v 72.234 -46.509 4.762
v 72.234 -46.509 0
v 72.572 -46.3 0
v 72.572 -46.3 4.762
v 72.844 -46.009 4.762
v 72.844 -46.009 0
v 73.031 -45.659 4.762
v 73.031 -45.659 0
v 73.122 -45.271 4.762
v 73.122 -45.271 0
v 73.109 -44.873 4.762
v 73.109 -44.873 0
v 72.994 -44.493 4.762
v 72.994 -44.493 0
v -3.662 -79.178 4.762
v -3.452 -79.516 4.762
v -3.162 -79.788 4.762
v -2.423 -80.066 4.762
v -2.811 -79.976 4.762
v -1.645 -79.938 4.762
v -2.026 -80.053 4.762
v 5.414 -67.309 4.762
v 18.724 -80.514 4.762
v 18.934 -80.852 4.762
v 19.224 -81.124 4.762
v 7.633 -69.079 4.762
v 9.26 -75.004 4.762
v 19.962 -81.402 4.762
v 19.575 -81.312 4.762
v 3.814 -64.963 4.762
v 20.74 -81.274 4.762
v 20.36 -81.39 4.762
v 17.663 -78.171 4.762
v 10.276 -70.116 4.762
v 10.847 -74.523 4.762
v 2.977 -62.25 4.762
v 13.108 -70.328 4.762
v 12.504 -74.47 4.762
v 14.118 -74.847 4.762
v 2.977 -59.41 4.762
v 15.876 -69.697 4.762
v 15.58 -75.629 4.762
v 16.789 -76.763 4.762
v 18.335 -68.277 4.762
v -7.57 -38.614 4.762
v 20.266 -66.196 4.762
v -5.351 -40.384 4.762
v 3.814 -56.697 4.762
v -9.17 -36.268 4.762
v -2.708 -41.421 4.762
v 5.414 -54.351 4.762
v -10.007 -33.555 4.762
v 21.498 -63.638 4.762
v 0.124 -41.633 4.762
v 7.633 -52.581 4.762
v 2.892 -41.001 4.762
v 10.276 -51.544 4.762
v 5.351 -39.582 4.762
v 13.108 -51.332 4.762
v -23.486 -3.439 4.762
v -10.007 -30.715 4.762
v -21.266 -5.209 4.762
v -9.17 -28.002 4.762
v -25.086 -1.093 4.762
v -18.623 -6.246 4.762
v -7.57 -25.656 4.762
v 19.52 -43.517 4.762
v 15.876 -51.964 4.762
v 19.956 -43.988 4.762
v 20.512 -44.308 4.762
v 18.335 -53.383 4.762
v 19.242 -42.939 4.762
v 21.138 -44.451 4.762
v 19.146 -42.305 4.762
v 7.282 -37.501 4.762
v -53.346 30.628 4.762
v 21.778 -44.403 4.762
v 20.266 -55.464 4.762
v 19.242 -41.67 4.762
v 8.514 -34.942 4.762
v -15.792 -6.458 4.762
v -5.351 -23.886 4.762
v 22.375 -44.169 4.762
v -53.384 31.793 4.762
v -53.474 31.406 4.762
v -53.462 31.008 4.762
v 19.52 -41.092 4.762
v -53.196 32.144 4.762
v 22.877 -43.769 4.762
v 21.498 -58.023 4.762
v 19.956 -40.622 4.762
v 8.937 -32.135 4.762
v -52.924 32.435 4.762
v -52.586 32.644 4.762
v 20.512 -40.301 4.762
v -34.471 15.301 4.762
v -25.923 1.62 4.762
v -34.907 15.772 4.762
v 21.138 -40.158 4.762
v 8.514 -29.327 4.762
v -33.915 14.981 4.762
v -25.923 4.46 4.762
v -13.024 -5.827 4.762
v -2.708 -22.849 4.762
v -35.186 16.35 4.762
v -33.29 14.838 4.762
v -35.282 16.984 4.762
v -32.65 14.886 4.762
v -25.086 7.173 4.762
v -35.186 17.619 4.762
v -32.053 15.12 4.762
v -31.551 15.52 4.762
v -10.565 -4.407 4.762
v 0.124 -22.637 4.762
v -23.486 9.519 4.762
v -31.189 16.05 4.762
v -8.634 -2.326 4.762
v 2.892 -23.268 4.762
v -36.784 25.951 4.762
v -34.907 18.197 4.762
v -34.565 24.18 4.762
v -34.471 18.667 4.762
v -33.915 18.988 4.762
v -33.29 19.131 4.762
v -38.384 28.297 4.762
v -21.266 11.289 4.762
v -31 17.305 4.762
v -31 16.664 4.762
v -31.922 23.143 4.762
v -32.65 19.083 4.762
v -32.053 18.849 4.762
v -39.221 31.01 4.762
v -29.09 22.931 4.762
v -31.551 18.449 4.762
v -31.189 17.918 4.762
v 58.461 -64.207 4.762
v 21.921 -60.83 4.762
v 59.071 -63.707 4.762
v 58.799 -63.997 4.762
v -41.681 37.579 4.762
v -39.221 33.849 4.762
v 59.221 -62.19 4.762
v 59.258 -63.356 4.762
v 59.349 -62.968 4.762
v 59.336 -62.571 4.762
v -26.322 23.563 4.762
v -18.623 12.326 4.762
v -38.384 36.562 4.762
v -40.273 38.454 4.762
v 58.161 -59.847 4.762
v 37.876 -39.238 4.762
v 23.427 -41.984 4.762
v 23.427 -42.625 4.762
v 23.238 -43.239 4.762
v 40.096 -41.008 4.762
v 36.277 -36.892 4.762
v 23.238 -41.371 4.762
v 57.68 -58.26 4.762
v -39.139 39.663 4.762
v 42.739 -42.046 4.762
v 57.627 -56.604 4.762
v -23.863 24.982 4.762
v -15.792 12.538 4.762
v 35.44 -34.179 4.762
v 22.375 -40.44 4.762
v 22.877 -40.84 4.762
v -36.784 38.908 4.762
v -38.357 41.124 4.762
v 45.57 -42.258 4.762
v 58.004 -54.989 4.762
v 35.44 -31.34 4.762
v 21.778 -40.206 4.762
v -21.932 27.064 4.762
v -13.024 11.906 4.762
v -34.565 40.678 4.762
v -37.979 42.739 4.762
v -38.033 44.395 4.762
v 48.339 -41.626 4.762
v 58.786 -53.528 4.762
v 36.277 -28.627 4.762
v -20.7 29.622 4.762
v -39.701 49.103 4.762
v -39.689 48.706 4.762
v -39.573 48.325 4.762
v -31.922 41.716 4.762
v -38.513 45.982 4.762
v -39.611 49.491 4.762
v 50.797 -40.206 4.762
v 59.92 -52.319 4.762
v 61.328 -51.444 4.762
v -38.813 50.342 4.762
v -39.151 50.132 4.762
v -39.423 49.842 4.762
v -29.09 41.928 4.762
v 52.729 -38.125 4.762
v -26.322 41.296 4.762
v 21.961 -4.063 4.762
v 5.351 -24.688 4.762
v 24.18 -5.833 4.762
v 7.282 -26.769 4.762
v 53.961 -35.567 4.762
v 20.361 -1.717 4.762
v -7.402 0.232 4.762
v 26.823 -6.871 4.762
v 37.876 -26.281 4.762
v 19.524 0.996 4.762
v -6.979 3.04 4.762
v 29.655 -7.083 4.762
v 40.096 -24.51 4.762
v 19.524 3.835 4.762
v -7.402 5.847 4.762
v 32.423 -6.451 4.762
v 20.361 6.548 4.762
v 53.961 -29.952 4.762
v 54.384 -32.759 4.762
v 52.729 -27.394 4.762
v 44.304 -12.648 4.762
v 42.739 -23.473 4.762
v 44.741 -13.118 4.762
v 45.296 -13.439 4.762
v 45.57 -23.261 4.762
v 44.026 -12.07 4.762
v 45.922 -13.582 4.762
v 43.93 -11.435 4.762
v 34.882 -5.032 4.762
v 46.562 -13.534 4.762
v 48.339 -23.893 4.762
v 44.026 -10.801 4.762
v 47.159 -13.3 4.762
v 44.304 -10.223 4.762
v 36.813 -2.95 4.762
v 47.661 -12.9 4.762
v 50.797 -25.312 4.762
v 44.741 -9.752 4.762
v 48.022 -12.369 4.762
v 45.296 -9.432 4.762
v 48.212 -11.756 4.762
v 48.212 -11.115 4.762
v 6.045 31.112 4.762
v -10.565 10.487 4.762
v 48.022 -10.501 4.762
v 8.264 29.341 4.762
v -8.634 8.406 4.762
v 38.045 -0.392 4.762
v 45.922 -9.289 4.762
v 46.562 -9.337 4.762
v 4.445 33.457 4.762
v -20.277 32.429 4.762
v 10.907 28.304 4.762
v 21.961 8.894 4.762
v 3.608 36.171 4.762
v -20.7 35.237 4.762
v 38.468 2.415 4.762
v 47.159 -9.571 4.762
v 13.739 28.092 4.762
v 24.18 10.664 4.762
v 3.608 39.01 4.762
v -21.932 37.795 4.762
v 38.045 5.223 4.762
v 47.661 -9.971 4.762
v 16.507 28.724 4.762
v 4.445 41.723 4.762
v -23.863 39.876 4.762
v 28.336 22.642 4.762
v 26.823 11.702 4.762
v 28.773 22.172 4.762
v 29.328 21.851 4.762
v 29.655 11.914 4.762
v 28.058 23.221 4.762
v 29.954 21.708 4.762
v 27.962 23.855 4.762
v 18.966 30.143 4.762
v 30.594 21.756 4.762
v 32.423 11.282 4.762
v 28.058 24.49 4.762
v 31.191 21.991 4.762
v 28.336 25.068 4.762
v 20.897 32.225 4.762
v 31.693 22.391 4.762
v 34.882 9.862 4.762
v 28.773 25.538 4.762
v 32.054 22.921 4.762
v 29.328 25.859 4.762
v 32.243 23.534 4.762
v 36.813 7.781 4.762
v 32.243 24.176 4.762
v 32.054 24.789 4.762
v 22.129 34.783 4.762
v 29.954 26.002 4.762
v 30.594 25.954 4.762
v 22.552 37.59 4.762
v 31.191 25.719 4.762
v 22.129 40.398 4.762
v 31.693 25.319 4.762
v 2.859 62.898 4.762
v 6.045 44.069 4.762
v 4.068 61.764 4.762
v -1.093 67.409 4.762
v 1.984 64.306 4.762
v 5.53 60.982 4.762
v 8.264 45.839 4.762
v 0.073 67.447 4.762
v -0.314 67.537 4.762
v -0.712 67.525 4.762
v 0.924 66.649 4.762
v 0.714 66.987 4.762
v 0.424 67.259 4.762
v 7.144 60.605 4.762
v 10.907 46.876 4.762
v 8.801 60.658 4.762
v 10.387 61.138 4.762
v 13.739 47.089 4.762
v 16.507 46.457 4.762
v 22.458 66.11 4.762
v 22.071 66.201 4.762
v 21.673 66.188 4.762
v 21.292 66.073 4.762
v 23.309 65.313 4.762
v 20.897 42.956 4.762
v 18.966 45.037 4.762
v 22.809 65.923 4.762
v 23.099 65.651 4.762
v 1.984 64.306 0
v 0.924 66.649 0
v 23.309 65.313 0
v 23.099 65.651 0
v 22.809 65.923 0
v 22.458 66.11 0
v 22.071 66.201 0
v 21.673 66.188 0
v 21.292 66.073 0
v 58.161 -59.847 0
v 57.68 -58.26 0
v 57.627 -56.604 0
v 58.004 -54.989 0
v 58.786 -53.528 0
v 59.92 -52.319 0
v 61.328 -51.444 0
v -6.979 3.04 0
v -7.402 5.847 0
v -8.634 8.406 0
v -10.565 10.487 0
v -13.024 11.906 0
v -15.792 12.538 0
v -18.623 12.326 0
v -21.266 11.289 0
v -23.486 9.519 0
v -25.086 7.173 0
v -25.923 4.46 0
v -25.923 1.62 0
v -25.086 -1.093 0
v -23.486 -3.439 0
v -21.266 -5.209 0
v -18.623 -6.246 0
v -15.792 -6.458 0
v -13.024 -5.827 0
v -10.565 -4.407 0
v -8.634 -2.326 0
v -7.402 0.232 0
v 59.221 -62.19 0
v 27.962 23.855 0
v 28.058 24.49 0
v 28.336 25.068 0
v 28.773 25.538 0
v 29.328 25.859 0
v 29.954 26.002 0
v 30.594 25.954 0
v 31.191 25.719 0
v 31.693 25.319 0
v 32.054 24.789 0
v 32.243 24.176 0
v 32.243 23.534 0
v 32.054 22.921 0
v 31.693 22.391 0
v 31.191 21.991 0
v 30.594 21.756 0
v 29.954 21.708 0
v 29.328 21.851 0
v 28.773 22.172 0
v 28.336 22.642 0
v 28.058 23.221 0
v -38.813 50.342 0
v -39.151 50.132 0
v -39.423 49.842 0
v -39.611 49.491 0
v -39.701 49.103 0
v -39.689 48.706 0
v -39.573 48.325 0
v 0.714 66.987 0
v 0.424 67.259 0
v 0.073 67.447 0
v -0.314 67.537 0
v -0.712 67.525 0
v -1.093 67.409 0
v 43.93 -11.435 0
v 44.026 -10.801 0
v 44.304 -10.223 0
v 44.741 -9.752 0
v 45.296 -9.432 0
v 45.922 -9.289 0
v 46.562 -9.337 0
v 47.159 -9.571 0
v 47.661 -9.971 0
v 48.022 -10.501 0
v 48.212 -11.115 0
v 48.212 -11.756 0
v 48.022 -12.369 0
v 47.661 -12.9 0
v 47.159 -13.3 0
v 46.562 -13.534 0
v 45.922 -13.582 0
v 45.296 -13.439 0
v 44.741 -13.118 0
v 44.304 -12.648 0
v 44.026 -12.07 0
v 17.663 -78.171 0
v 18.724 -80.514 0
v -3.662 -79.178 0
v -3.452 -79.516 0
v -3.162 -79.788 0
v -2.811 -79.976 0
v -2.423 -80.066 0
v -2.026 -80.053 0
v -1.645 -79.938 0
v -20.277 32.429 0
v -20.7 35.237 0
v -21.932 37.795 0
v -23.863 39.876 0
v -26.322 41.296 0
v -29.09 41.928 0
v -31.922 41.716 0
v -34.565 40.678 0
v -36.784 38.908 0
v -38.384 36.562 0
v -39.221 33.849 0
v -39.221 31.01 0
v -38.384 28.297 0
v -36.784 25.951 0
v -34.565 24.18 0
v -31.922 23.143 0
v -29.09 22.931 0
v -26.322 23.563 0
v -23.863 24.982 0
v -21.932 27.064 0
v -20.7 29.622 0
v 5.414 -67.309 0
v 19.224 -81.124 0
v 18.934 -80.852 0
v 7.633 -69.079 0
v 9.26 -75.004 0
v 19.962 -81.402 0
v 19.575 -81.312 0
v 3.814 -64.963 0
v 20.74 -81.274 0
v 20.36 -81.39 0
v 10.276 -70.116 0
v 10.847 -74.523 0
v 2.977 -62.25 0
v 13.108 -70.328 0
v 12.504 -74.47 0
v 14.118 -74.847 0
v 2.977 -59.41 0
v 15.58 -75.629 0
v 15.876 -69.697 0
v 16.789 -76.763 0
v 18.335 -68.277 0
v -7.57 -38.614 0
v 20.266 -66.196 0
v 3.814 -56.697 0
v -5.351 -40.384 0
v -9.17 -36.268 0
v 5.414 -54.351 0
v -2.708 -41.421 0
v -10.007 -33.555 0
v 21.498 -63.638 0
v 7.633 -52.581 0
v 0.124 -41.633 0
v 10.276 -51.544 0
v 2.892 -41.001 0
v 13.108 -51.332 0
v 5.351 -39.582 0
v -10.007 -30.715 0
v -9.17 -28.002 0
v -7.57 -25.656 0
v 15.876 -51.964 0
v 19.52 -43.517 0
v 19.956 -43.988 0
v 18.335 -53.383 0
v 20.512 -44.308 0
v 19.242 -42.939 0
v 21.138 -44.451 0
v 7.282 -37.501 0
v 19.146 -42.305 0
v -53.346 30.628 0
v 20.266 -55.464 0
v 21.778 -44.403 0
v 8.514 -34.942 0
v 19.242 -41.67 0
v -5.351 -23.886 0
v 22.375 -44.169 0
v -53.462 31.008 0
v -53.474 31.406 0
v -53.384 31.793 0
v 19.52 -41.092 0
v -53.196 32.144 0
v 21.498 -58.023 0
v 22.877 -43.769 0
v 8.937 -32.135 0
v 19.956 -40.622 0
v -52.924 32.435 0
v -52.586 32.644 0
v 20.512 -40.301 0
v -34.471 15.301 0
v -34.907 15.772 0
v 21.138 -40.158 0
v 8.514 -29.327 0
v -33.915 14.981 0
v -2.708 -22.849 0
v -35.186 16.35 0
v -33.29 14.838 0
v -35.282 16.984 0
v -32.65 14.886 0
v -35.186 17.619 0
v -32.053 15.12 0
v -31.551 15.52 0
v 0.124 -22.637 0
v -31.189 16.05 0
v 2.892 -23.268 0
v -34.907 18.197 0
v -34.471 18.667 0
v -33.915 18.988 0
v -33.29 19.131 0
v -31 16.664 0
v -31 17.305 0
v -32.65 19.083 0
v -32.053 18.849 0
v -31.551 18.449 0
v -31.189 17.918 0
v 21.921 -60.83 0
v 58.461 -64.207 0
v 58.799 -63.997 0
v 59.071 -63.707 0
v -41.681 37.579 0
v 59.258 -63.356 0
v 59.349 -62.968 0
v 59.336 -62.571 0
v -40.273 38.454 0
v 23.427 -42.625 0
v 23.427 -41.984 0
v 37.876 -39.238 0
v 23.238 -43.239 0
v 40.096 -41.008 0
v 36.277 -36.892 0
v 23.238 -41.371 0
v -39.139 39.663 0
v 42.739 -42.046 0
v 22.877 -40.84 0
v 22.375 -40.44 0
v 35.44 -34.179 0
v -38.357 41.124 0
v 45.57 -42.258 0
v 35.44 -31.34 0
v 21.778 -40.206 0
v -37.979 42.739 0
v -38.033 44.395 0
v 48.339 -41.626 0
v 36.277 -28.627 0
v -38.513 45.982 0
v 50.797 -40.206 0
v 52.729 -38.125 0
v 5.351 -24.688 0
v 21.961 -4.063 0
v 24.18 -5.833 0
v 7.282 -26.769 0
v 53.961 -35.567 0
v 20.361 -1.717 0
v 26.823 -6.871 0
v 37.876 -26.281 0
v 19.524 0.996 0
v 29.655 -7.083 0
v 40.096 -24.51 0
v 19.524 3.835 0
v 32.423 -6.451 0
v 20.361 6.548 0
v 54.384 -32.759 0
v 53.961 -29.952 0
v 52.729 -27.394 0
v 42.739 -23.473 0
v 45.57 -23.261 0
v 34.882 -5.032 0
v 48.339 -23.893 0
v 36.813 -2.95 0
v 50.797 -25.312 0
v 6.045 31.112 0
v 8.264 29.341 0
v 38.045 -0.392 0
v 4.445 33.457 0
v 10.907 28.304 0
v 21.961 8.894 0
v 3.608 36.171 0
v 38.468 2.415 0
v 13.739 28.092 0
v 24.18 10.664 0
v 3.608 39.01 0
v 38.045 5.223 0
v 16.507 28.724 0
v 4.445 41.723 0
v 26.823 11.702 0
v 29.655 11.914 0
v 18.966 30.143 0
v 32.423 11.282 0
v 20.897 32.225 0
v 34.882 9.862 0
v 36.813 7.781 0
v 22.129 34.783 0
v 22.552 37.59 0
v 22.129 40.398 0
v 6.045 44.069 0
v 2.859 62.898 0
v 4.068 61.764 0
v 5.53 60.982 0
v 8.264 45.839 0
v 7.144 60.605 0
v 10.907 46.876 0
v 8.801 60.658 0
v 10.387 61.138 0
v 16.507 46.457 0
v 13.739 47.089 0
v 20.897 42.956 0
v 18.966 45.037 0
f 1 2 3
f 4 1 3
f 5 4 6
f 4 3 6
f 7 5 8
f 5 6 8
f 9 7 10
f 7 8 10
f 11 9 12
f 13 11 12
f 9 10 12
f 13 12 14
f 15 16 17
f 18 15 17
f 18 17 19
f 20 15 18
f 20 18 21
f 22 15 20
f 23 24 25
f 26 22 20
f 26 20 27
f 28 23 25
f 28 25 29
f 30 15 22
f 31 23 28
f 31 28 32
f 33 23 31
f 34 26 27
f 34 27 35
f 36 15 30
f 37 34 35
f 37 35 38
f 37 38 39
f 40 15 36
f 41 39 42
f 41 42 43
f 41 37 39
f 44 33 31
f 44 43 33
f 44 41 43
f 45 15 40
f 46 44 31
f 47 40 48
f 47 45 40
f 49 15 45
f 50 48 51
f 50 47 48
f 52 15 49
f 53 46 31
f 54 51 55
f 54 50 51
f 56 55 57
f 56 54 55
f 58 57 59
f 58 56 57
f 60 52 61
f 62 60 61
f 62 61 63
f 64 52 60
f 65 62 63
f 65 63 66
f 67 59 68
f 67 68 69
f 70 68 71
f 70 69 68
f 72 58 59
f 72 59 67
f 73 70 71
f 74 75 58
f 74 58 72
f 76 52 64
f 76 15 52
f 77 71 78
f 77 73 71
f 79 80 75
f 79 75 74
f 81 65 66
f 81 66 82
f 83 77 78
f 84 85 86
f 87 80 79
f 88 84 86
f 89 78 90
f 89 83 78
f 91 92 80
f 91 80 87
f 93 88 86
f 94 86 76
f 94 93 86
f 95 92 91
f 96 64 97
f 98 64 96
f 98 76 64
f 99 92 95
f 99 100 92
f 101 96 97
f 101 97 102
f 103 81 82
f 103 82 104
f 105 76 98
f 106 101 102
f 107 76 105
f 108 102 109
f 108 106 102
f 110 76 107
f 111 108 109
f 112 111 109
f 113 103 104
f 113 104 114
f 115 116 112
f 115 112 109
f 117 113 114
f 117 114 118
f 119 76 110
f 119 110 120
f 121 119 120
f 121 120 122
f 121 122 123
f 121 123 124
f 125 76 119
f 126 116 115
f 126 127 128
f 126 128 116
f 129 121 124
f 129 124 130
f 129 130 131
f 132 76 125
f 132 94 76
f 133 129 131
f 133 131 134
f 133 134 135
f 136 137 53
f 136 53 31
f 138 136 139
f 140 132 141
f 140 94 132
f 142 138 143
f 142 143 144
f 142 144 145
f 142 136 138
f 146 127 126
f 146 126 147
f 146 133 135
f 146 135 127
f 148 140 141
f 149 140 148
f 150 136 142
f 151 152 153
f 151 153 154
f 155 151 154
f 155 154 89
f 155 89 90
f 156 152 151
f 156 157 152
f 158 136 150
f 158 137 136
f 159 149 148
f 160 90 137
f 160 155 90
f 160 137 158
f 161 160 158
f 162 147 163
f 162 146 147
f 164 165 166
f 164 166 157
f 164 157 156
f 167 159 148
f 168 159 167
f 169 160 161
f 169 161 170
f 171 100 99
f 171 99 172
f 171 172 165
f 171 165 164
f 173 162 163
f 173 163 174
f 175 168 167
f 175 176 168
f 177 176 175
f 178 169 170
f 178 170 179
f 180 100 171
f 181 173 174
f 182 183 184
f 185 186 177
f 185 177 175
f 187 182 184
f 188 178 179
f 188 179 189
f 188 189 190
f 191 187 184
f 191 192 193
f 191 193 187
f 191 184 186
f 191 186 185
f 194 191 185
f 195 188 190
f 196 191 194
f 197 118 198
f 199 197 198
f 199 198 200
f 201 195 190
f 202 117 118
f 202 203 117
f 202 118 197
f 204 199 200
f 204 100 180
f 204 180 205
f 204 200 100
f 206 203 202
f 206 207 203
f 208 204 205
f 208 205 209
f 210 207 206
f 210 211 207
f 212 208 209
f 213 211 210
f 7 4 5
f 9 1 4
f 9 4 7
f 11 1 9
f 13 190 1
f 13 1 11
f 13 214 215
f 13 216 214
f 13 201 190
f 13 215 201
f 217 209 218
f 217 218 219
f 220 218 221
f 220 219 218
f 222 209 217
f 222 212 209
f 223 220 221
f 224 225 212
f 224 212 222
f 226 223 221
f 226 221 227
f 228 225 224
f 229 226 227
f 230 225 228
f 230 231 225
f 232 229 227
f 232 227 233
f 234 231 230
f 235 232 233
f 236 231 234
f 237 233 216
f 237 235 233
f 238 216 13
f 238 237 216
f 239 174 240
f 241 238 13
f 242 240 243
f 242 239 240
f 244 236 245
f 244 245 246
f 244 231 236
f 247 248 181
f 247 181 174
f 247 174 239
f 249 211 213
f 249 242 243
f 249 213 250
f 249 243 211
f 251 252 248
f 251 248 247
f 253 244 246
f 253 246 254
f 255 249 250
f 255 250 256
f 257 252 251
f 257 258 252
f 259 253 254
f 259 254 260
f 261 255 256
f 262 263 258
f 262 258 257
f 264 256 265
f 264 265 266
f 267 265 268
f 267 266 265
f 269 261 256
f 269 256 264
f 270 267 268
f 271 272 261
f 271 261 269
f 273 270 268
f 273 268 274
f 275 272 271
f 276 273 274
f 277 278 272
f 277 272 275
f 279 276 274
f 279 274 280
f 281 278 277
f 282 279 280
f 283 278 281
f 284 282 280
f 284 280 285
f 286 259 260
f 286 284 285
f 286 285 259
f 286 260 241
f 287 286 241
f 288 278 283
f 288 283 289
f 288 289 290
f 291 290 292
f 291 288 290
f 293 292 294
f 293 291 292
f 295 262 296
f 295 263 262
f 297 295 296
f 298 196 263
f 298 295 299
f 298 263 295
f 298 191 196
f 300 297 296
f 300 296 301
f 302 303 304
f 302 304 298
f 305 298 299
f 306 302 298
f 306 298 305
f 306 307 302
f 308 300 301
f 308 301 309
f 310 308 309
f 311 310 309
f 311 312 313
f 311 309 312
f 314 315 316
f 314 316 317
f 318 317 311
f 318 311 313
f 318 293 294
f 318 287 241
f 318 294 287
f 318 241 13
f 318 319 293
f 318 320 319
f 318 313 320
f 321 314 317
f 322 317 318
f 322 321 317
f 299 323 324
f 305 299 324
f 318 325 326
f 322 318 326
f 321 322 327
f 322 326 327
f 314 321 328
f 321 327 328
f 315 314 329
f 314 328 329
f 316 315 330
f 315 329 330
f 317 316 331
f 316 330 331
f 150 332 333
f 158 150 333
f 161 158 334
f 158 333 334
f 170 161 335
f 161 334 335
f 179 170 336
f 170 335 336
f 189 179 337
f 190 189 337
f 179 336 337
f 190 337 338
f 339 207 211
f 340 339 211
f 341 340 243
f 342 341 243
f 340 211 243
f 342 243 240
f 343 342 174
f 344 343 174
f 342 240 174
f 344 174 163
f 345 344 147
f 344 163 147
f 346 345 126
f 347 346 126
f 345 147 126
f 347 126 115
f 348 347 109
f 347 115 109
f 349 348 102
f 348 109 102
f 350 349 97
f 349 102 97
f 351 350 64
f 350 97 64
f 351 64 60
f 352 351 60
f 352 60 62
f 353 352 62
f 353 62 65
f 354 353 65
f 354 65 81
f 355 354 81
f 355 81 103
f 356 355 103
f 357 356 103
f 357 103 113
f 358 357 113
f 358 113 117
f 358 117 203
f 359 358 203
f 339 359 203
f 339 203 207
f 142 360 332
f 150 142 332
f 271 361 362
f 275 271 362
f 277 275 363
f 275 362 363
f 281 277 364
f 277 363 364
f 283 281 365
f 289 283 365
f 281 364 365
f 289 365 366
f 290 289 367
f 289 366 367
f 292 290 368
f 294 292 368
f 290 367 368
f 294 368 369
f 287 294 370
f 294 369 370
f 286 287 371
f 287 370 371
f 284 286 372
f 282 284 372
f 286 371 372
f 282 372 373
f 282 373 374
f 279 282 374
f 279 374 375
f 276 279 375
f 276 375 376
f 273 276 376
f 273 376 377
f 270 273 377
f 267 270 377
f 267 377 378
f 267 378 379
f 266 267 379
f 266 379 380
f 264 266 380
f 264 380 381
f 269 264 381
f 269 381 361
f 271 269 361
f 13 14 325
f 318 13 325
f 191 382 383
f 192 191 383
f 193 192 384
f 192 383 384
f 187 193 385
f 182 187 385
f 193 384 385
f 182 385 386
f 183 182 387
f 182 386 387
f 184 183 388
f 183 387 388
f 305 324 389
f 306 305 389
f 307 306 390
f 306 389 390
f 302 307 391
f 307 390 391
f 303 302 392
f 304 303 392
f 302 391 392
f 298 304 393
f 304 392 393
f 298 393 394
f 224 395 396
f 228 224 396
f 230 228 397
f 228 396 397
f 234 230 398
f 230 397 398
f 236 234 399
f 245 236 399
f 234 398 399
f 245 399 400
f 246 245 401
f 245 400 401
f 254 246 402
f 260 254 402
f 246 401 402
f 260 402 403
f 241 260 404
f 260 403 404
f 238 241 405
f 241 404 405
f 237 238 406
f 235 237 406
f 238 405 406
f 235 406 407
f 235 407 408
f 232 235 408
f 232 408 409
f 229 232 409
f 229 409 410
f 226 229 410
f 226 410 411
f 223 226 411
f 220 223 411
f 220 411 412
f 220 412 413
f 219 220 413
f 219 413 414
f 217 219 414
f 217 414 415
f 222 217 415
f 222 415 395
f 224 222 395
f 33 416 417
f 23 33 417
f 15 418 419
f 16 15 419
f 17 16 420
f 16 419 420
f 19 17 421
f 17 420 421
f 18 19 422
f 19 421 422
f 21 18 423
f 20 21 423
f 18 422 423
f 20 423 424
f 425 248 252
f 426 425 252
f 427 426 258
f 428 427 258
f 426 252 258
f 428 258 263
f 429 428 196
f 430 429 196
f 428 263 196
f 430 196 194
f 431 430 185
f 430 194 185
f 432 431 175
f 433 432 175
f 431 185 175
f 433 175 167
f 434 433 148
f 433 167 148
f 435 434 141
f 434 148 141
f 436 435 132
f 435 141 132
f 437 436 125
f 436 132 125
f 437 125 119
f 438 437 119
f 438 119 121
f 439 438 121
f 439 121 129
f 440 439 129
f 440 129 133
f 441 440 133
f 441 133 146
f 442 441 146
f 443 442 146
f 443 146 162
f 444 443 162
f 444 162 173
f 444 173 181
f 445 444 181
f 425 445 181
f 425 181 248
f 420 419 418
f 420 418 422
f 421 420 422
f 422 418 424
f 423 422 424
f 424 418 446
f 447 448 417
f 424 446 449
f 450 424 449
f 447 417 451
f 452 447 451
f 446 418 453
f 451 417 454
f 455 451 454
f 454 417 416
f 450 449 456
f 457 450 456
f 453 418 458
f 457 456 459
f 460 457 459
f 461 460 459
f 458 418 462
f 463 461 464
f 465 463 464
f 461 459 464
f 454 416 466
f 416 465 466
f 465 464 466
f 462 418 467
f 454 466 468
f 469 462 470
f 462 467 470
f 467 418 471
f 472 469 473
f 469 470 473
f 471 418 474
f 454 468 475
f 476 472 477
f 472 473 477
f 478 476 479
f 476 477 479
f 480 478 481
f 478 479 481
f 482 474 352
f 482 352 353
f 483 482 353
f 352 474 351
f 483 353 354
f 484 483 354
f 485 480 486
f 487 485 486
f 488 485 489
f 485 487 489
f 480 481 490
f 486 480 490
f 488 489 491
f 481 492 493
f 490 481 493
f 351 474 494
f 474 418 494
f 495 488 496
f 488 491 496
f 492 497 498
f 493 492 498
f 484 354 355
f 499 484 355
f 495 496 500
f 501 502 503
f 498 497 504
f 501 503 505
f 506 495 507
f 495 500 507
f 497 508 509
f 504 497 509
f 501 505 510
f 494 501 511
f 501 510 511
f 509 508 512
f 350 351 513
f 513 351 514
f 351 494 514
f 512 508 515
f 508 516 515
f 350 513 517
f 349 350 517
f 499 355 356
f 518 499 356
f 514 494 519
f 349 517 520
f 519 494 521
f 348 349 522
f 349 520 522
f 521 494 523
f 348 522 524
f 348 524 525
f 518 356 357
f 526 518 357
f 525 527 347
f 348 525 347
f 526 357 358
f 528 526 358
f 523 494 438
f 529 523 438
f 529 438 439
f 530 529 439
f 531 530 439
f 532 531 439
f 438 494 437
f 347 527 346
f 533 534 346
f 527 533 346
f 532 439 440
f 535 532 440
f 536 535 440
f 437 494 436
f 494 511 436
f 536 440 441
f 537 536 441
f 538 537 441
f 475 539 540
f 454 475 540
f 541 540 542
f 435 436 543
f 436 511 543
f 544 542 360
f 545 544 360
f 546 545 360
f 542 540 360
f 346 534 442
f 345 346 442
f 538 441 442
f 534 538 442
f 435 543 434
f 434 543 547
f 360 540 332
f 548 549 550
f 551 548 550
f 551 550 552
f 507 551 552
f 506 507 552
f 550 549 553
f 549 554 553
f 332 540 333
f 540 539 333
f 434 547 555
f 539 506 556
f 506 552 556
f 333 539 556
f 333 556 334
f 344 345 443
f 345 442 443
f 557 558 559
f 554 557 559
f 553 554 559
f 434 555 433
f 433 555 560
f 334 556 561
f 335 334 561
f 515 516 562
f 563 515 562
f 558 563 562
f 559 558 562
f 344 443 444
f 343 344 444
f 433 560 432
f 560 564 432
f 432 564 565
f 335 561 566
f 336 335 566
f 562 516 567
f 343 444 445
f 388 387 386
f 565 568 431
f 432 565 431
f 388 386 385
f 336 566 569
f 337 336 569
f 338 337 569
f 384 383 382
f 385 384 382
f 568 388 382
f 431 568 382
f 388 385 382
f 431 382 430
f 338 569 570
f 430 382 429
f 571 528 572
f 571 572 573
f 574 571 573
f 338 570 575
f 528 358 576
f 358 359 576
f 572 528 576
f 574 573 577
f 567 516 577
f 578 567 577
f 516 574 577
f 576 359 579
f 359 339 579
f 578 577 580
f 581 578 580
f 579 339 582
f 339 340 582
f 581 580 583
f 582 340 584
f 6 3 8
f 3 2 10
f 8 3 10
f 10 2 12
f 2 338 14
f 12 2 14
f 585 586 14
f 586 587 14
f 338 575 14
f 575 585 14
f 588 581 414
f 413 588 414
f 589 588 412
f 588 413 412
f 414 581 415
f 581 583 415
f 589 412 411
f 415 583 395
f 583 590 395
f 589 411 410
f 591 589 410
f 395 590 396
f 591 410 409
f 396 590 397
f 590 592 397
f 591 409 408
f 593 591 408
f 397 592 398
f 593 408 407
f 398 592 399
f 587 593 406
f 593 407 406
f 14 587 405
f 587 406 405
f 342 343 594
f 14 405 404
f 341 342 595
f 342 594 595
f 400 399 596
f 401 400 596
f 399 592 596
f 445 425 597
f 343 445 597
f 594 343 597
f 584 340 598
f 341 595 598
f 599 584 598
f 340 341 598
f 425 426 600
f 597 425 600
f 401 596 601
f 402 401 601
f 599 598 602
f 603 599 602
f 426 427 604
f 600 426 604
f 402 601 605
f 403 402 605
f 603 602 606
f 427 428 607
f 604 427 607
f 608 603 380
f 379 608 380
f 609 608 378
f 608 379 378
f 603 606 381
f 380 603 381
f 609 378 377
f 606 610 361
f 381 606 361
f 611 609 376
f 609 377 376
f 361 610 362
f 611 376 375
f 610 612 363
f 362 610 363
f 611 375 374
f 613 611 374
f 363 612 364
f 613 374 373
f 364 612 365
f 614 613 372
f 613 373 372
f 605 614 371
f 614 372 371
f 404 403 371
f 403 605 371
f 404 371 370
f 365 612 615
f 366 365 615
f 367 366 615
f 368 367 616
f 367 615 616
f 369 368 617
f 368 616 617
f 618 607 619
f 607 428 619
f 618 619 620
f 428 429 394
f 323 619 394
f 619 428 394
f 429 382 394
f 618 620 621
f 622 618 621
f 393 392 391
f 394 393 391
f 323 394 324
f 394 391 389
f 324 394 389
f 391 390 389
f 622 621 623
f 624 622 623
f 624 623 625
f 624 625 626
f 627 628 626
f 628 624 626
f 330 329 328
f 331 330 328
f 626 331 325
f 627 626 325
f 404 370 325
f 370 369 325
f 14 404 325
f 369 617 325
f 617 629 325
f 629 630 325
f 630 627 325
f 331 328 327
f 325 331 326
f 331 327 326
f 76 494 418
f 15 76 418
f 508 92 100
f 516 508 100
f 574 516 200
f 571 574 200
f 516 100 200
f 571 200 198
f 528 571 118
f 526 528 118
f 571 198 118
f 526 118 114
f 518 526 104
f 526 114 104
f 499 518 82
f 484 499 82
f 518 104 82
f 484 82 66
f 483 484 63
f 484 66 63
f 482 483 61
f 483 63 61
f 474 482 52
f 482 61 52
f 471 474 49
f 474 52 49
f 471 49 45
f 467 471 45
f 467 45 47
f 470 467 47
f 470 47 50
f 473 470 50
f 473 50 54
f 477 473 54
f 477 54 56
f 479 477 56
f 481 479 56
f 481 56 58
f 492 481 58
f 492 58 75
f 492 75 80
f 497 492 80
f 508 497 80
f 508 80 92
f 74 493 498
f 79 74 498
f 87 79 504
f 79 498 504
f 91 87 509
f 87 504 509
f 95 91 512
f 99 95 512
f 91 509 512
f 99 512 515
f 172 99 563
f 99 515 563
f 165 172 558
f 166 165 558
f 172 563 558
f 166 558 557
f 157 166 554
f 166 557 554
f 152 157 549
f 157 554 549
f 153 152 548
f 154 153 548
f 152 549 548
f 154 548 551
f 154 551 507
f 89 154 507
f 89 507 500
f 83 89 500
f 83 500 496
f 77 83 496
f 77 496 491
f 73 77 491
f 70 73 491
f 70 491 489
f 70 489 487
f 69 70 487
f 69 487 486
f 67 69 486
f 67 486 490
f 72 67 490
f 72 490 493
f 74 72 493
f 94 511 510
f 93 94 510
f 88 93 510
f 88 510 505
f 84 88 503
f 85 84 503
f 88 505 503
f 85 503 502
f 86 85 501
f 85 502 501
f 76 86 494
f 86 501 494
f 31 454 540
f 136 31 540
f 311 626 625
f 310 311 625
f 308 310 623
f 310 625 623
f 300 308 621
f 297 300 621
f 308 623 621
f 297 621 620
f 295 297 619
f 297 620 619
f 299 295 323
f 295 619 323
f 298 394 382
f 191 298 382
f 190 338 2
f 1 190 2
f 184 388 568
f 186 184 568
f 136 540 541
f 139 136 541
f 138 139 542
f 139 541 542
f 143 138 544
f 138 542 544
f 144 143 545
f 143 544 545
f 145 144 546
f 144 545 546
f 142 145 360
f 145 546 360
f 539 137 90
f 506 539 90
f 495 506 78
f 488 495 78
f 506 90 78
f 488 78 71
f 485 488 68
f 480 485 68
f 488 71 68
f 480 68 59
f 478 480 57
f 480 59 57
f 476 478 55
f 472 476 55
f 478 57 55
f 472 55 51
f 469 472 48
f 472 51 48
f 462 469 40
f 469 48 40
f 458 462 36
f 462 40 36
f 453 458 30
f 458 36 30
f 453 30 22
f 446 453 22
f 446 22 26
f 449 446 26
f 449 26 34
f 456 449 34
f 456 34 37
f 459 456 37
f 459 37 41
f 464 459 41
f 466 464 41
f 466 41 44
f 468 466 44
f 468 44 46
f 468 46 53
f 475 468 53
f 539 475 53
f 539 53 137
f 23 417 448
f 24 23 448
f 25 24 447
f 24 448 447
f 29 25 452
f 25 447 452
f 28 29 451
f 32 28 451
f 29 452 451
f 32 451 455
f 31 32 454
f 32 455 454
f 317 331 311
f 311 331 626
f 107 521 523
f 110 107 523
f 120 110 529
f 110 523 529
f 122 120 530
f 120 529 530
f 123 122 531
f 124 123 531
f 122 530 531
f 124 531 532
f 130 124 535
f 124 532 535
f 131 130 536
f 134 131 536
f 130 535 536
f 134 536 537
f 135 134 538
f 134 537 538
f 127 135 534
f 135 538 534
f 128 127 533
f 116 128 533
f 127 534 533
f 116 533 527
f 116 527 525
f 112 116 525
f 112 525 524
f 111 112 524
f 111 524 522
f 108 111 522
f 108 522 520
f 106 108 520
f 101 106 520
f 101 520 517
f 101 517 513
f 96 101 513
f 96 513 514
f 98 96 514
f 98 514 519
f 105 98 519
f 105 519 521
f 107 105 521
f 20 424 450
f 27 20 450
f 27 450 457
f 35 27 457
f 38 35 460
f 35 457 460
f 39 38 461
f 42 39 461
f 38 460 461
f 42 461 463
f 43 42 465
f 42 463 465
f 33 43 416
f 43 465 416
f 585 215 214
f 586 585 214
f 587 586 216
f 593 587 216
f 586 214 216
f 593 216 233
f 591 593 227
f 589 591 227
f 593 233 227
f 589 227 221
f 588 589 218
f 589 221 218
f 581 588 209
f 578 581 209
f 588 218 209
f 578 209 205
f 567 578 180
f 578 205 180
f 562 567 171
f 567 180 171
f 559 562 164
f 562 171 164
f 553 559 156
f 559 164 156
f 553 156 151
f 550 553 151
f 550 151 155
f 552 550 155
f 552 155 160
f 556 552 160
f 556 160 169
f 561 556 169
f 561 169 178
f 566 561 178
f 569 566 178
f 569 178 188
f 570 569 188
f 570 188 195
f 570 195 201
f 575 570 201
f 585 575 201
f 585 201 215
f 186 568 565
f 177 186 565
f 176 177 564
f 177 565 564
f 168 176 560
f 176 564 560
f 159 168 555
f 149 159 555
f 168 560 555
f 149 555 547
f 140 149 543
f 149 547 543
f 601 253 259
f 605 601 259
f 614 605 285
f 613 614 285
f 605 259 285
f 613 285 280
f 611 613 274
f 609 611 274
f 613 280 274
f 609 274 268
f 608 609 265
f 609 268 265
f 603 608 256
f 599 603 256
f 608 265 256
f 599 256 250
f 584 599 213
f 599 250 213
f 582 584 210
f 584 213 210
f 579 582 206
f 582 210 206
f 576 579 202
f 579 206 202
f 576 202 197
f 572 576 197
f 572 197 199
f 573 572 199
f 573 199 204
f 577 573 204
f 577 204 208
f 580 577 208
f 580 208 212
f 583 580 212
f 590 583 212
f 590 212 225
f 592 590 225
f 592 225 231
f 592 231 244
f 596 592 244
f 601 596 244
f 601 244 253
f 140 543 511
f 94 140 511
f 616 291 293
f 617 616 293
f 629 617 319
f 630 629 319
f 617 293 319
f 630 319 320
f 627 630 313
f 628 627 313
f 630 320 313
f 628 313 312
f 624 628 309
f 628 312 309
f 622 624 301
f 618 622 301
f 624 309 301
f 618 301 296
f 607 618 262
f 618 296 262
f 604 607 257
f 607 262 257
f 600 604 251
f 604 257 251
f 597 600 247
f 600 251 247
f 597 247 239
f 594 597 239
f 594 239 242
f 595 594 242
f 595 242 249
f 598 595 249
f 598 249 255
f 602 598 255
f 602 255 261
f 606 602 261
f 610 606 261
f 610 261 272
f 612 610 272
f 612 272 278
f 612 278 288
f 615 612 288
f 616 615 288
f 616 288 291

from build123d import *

# Parameters (mm, degrees)
BOSS_EXTRUDE1_DEPTH   = 4.7625
F_6_CLEARANCE_HOLE1_D = 4.3053
SKETCH6_R             = 9.525
CUT_EXTRUDE1_DEPTH    = 5.7625


with BuildPart() as part:
    # Sketch1 → Boss-Extrude1 (new body)
    with BuildSketch(Plane.XY):
        with BuildLine():
            Line((61.328308874, -51.443881834), (72.233641051, -46.509447198))
            ThreePointArc((72.233641051, -46.509447198), (73.031430575, -45.658526875), (72.993861427, -44.492712962))
            Line((72.993861427, -44.492712962), (23.309209228, 65.312700679))
            ThreePointArc((23.309209228, 65.312700679), (22.458288905, 66.110490204), (21.292474992, 66.072921056))
            Line((21.292474992, 66.072921056), (10.387142815, 61.13848642))
            ThreePointArc((10.387142815, 61.13848642), (5.529584843, 60.981948303), (1.984083498, 64.306071322))
            Line((1.984083498, 64.306071322), (0.923899929, 66.649126776))
            ThreePointArc((0.923899929, 66.649126776), (0.072979606, 67.4469163), (-1.092834307, 67.409347153))
            Line((-1.092834307, 67.409347153), (-38.813134462, 50.341700559))
            ThreePointArc((-38.813134462, 50.341700559), (-39.610923987, 49.490780236), (-39.573354839, 48.324966323))
            Line((-39.573354839, 48.324966323), (-38.51317127, 45.981910869))
            ThreePointArc((-38.51317127, 45.981910869), (-38.356633153, 41.124352897), (-41.680756172, 37.578851552))
            Line((-41.680756172, 37.578851552), (-52.586088348, 32.644416915))
            ThreePointArc((-52.586088348, 32.644416915), (-53.383877873, 31.793496593), (-53.346308725, 30.627682679))
            Line((-53.346308725, 30.627682679), (-3.661656526, -79.177730962))
            ThreePointArc((-3.661656526, -79.177730962), (-2.810736203, -79.975520486), (-1.64492229, -79.937951338))
            Line((-1.64492229, -79.937951338), (9.260409887, -75.003516702))
            ThreePointArc((9.260409887, -75.003516702), (14.117967859, -74.846978586), (17.663469204, -78.171101604))
            Line((17.663469204, -78.171101604), (18.723652773, -80.514157058))
            ThreePointArc((18.723652773, -80.514157058), (19.574573096, -81.311946583), (20.740387009, -81.274377435))
            Line((20.740387009, -81.274377435), (58.460687164, -64.206730842))
            ThreePointArc((58.460687164, -64.206730842), (59.258476689, -63.355810519), (59.220907541, -62.189996606))
            Line((59.220907541, -62.189996606), (58.160723972, -59.846941151))
            ThreePointArc((58.160723972, -59.846941151), (58.004185856, -54.989383179), (61.328308874, -51.443881834))
        make_face()
    extrude(amount=BOSS_EXTRUDE1_DEPTH)

    # #6 Clearance Hole1 (through all)
    with Locations(Plane.XY.offset(4.7625)):
        with Locations((30.114722566, 23.855073088), (46.082919532, -11.435391781), (-33.128884005, 16.984419854), (21.298547528, -42.304619004)):
            Hole(F_6_CLEARANCE_HOLE1_D / 2)

    # Sketch6 → Cut-Extrude1 (cut, through all)
    with BuildSketch(Plane.XY.offset(4.7625)):
        with Locations((13.026989476, 37.590195142)):
            Circle(SKETCH6_R)
        with Locations((28.942831698, 2.415436715)):
            Circle(SKETCH6_R)
        with Locations((44.858673919, -32.759321712)):
            Circle(SKETCH6_R)
        with Locations((-16.503976684, 3.039878823)):
            Circle(SKETCH6_R)
        with Locations((-0.588134462, -32.134879603)):
            Circle(SKETCH6_R)
        with Locations((-29.802081698, 32.42931514)):
            Circle(SKETCH6_R)
        with Locations((12.395842088, -60.830077267)):
            Circle(SKETCH6_R)
    extrude(amount=-CUT_EXTRUDE1_DEPTH, mode=Mode.SUBTRACT)


solid = part.part
